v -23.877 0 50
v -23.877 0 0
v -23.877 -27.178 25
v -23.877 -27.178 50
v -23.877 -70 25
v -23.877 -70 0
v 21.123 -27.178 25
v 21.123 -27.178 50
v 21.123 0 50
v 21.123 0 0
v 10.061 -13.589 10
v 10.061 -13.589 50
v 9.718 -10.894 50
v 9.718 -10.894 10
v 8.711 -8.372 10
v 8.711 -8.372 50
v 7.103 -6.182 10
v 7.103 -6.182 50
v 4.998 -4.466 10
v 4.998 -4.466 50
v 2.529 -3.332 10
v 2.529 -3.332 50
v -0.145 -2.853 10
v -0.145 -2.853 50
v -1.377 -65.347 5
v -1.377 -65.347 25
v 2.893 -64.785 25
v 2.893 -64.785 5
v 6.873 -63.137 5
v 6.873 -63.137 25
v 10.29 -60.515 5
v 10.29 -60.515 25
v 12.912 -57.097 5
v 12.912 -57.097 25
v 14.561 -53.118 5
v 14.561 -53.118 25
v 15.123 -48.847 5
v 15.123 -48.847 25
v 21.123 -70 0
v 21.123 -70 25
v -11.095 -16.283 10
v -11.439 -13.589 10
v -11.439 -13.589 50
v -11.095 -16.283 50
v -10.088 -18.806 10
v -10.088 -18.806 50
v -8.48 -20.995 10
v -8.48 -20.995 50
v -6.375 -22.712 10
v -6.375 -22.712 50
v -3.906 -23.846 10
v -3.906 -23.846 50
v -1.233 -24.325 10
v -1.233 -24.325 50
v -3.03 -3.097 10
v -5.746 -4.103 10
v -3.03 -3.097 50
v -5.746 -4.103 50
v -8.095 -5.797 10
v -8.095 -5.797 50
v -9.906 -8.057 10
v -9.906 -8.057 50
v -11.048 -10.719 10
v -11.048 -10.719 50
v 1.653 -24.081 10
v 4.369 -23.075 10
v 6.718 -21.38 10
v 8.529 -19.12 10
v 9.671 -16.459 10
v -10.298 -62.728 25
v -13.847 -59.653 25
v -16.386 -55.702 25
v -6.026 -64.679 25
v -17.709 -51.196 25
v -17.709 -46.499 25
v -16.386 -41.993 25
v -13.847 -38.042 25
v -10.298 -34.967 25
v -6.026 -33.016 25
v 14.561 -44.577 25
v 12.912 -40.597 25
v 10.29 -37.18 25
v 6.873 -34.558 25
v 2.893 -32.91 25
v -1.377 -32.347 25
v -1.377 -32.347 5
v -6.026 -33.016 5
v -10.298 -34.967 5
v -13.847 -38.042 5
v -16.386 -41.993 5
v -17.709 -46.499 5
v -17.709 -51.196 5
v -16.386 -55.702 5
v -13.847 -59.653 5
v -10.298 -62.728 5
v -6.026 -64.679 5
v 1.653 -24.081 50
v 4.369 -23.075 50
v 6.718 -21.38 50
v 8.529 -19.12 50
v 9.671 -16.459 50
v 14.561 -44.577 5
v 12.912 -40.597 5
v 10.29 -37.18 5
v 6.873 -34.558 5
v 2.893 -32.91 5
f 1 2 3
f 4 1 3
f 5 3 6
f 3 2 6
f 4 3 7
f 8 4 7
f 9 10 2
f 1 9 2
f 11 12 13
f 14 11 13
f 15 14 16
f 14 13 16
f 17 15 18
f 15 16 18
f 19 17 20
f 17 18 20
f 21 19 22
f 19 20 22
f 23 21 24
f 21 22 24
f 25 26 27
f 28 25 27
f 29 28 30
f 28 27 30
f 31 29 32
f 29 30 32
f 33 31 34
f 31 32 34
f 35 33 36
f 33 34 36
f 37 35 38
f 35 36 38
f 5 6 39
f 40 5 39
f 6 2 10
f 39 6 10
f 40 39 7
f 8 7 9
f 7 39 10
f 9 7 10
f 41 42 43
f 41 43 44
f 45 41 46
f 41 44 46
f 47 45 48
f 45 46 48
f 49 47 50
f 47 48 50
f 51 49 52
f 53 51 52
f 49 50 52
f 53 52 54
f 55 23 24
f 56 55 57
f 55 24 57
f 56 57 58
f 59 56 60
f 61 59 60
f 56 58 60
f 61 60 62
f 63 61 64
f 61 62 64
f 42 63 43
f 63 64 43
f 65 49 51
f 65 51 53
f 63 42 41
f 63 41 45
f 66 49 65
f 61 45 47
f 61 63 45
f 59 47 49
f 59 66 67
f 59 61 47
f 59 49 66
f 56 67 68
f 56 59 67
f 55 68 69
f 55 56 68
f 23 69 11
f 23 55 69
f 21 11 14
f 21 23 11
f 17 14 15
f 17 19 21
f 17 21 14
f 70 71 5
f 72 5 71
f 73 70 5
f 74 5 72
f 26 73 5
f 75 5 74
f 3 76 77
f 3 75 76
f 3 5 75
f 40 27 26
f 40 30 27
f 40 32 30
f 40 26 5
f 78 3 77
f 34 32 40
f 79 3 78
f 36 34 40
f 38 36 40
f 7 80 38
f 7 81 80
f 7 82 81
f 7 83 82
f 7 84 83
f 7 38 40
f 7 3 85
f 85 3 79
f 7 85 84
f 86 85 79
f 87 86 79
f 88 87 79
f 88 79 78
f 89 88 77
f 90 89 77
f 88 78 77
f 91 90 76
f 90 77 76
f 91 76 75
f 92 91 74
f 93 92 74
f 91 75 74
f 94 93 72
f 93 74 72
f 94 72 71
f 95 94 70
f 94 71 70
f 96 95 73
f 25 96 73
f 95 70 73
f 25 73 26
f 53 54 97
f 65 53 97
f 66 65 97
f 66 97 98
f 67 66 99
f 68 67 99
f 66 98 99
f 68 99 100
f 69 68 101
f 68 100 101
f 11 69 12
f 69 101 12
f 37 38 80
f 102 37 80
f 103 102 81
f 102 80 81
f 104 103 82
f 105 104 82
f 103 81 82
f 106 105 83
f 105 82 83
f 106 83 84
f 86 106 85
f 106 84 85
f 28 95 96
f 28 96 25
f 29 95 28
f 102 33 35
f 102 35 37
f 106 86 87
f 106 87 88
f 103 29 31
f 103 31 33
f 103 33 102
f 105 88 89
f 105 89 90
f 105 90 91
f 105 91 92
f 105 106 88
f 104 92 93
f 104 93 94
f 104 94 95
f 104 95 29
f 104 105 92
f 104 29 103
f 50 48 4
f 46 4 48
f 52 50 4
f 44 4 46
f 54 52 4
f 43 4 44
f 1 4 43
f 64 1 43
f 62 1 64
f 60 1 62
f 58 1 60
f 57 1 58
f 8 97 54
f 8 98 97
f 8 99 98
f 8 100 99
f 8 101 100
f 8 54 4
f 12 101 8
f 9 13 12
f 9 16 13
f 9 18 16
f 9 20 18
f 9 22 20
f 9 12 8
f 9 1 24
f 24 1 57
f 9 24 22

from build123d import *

# Parameters (mm, degrees)
F0_W     = 45
F0_H     = 70
F1_DEPTH = 25
F3_DEPTH = 20
F5_DEPTH = 25
F7_DEPTH = 40


with BuildPart() as f1:
    # F0 (on Top) → F1 (new body)
    with BuildSketch(Plane.XY):
        with Locations((-1.3771308213, -35)):
            Rectangle(F0_W, F0_H)
    extrude(amount=F1_DEPTH)

    # F2 (on face) → F3 (cut)
    with BuildSketch(Plane.XY.offset(25)):
        with BuildLine():
            Line((-1.3771308213, -32.347425729), (-1.3771308213, -65.347425729))
            ThreePointArc((-1.3771308213, -65.347425729), (10.2901310682, -60.5146876186), (15.1228691787, -48.847425729))
            ThreePointArc((15.1228691787, -48.847425729), (10.2901310682, -37.1801638395), (-1.3771308213, -32.347425729))
        make_face()
        with BuildLine():
            ThreePointArc((-1.3771308213, -32.347425729), (-17.8771308213, -48.847425729), (-1.3771308213, -65.347425729))
            Line((-1.3771308213, -65.347425729), (-1.3771308213, -32.347425729))
        make_face()
    extrude(amount=-F3_DEPTH, mode=Mode.SUBTRACT)

    # F4 (on face) → F5 (join)
    with BuildSketch(Plane.XY.offset(25)):
        Polygon((-23.8771308213, 0), (-23.8771308213, -27.1776393056), (0, -27.1776393056), (21.1228691787, -27.1776393056), (21.1228691787, 0), align=None)
    extrude(amount=F5_DEPTH)

    # F6 (on face) → F7 (cut)
    with BuildSketch(Plane.XY.offset(50)):
        with BuildLine():
            ThreePointArc((-0.1445451178, -2.8525939696), (-8.0951260785, -5.7974552618), (-11.4385654107, -13.5888196528))
            Line((-11.4385654107, -13.5888196528), (-0.6885654107, -13.5888196528))
            Line((-0.6885654107, -13.5888196528), (-0.1445451178, -2.8525939696))
        make_face()
        with BuildLine():
            Line((-0.6885654107, -13.5888196528), (-11.4385654107, -13.5888196528))
            ThreePointArc((-11.4385654107, -13.5888196528), (-8.4799298017, -20.9953803206), (-1.2325857035, -24.325045336))
            Line((-1.2325857035, -24.325045336), (-0.6885654107, -13.5888196528))
        make_face()
        with BuildLine():
            Line((-0.1445451178, -2.8525939696), (-0.6885654107, -13.5888196528))
            Line((-0.6885654107, -13.5888196528), (10.0614345893, -13.5888196528))
            ThreePointArc((10.0614345893, -13.5888196528), (7.1027989804, -6.182258985), (-0.1445451178, -2.8525939696))
        make_face()
        with BuildLine():
            Line((10.0614345893, -13.5888196528), (-0.6885654107, -13.5888196528))
            Line((-0.6885654107, -13.5888196528), (-1.2325857035, -24.325045336))
            ThreePointArc((-1.2325857035, -24.325045336), (6.7179952571, -21.3801840438), (10.0614345893, -13.5888196528))
        make_face()
    extrude(amount=-F7_DEPTH, mode=Mode.SUBTRACT)


solid = f1.part
